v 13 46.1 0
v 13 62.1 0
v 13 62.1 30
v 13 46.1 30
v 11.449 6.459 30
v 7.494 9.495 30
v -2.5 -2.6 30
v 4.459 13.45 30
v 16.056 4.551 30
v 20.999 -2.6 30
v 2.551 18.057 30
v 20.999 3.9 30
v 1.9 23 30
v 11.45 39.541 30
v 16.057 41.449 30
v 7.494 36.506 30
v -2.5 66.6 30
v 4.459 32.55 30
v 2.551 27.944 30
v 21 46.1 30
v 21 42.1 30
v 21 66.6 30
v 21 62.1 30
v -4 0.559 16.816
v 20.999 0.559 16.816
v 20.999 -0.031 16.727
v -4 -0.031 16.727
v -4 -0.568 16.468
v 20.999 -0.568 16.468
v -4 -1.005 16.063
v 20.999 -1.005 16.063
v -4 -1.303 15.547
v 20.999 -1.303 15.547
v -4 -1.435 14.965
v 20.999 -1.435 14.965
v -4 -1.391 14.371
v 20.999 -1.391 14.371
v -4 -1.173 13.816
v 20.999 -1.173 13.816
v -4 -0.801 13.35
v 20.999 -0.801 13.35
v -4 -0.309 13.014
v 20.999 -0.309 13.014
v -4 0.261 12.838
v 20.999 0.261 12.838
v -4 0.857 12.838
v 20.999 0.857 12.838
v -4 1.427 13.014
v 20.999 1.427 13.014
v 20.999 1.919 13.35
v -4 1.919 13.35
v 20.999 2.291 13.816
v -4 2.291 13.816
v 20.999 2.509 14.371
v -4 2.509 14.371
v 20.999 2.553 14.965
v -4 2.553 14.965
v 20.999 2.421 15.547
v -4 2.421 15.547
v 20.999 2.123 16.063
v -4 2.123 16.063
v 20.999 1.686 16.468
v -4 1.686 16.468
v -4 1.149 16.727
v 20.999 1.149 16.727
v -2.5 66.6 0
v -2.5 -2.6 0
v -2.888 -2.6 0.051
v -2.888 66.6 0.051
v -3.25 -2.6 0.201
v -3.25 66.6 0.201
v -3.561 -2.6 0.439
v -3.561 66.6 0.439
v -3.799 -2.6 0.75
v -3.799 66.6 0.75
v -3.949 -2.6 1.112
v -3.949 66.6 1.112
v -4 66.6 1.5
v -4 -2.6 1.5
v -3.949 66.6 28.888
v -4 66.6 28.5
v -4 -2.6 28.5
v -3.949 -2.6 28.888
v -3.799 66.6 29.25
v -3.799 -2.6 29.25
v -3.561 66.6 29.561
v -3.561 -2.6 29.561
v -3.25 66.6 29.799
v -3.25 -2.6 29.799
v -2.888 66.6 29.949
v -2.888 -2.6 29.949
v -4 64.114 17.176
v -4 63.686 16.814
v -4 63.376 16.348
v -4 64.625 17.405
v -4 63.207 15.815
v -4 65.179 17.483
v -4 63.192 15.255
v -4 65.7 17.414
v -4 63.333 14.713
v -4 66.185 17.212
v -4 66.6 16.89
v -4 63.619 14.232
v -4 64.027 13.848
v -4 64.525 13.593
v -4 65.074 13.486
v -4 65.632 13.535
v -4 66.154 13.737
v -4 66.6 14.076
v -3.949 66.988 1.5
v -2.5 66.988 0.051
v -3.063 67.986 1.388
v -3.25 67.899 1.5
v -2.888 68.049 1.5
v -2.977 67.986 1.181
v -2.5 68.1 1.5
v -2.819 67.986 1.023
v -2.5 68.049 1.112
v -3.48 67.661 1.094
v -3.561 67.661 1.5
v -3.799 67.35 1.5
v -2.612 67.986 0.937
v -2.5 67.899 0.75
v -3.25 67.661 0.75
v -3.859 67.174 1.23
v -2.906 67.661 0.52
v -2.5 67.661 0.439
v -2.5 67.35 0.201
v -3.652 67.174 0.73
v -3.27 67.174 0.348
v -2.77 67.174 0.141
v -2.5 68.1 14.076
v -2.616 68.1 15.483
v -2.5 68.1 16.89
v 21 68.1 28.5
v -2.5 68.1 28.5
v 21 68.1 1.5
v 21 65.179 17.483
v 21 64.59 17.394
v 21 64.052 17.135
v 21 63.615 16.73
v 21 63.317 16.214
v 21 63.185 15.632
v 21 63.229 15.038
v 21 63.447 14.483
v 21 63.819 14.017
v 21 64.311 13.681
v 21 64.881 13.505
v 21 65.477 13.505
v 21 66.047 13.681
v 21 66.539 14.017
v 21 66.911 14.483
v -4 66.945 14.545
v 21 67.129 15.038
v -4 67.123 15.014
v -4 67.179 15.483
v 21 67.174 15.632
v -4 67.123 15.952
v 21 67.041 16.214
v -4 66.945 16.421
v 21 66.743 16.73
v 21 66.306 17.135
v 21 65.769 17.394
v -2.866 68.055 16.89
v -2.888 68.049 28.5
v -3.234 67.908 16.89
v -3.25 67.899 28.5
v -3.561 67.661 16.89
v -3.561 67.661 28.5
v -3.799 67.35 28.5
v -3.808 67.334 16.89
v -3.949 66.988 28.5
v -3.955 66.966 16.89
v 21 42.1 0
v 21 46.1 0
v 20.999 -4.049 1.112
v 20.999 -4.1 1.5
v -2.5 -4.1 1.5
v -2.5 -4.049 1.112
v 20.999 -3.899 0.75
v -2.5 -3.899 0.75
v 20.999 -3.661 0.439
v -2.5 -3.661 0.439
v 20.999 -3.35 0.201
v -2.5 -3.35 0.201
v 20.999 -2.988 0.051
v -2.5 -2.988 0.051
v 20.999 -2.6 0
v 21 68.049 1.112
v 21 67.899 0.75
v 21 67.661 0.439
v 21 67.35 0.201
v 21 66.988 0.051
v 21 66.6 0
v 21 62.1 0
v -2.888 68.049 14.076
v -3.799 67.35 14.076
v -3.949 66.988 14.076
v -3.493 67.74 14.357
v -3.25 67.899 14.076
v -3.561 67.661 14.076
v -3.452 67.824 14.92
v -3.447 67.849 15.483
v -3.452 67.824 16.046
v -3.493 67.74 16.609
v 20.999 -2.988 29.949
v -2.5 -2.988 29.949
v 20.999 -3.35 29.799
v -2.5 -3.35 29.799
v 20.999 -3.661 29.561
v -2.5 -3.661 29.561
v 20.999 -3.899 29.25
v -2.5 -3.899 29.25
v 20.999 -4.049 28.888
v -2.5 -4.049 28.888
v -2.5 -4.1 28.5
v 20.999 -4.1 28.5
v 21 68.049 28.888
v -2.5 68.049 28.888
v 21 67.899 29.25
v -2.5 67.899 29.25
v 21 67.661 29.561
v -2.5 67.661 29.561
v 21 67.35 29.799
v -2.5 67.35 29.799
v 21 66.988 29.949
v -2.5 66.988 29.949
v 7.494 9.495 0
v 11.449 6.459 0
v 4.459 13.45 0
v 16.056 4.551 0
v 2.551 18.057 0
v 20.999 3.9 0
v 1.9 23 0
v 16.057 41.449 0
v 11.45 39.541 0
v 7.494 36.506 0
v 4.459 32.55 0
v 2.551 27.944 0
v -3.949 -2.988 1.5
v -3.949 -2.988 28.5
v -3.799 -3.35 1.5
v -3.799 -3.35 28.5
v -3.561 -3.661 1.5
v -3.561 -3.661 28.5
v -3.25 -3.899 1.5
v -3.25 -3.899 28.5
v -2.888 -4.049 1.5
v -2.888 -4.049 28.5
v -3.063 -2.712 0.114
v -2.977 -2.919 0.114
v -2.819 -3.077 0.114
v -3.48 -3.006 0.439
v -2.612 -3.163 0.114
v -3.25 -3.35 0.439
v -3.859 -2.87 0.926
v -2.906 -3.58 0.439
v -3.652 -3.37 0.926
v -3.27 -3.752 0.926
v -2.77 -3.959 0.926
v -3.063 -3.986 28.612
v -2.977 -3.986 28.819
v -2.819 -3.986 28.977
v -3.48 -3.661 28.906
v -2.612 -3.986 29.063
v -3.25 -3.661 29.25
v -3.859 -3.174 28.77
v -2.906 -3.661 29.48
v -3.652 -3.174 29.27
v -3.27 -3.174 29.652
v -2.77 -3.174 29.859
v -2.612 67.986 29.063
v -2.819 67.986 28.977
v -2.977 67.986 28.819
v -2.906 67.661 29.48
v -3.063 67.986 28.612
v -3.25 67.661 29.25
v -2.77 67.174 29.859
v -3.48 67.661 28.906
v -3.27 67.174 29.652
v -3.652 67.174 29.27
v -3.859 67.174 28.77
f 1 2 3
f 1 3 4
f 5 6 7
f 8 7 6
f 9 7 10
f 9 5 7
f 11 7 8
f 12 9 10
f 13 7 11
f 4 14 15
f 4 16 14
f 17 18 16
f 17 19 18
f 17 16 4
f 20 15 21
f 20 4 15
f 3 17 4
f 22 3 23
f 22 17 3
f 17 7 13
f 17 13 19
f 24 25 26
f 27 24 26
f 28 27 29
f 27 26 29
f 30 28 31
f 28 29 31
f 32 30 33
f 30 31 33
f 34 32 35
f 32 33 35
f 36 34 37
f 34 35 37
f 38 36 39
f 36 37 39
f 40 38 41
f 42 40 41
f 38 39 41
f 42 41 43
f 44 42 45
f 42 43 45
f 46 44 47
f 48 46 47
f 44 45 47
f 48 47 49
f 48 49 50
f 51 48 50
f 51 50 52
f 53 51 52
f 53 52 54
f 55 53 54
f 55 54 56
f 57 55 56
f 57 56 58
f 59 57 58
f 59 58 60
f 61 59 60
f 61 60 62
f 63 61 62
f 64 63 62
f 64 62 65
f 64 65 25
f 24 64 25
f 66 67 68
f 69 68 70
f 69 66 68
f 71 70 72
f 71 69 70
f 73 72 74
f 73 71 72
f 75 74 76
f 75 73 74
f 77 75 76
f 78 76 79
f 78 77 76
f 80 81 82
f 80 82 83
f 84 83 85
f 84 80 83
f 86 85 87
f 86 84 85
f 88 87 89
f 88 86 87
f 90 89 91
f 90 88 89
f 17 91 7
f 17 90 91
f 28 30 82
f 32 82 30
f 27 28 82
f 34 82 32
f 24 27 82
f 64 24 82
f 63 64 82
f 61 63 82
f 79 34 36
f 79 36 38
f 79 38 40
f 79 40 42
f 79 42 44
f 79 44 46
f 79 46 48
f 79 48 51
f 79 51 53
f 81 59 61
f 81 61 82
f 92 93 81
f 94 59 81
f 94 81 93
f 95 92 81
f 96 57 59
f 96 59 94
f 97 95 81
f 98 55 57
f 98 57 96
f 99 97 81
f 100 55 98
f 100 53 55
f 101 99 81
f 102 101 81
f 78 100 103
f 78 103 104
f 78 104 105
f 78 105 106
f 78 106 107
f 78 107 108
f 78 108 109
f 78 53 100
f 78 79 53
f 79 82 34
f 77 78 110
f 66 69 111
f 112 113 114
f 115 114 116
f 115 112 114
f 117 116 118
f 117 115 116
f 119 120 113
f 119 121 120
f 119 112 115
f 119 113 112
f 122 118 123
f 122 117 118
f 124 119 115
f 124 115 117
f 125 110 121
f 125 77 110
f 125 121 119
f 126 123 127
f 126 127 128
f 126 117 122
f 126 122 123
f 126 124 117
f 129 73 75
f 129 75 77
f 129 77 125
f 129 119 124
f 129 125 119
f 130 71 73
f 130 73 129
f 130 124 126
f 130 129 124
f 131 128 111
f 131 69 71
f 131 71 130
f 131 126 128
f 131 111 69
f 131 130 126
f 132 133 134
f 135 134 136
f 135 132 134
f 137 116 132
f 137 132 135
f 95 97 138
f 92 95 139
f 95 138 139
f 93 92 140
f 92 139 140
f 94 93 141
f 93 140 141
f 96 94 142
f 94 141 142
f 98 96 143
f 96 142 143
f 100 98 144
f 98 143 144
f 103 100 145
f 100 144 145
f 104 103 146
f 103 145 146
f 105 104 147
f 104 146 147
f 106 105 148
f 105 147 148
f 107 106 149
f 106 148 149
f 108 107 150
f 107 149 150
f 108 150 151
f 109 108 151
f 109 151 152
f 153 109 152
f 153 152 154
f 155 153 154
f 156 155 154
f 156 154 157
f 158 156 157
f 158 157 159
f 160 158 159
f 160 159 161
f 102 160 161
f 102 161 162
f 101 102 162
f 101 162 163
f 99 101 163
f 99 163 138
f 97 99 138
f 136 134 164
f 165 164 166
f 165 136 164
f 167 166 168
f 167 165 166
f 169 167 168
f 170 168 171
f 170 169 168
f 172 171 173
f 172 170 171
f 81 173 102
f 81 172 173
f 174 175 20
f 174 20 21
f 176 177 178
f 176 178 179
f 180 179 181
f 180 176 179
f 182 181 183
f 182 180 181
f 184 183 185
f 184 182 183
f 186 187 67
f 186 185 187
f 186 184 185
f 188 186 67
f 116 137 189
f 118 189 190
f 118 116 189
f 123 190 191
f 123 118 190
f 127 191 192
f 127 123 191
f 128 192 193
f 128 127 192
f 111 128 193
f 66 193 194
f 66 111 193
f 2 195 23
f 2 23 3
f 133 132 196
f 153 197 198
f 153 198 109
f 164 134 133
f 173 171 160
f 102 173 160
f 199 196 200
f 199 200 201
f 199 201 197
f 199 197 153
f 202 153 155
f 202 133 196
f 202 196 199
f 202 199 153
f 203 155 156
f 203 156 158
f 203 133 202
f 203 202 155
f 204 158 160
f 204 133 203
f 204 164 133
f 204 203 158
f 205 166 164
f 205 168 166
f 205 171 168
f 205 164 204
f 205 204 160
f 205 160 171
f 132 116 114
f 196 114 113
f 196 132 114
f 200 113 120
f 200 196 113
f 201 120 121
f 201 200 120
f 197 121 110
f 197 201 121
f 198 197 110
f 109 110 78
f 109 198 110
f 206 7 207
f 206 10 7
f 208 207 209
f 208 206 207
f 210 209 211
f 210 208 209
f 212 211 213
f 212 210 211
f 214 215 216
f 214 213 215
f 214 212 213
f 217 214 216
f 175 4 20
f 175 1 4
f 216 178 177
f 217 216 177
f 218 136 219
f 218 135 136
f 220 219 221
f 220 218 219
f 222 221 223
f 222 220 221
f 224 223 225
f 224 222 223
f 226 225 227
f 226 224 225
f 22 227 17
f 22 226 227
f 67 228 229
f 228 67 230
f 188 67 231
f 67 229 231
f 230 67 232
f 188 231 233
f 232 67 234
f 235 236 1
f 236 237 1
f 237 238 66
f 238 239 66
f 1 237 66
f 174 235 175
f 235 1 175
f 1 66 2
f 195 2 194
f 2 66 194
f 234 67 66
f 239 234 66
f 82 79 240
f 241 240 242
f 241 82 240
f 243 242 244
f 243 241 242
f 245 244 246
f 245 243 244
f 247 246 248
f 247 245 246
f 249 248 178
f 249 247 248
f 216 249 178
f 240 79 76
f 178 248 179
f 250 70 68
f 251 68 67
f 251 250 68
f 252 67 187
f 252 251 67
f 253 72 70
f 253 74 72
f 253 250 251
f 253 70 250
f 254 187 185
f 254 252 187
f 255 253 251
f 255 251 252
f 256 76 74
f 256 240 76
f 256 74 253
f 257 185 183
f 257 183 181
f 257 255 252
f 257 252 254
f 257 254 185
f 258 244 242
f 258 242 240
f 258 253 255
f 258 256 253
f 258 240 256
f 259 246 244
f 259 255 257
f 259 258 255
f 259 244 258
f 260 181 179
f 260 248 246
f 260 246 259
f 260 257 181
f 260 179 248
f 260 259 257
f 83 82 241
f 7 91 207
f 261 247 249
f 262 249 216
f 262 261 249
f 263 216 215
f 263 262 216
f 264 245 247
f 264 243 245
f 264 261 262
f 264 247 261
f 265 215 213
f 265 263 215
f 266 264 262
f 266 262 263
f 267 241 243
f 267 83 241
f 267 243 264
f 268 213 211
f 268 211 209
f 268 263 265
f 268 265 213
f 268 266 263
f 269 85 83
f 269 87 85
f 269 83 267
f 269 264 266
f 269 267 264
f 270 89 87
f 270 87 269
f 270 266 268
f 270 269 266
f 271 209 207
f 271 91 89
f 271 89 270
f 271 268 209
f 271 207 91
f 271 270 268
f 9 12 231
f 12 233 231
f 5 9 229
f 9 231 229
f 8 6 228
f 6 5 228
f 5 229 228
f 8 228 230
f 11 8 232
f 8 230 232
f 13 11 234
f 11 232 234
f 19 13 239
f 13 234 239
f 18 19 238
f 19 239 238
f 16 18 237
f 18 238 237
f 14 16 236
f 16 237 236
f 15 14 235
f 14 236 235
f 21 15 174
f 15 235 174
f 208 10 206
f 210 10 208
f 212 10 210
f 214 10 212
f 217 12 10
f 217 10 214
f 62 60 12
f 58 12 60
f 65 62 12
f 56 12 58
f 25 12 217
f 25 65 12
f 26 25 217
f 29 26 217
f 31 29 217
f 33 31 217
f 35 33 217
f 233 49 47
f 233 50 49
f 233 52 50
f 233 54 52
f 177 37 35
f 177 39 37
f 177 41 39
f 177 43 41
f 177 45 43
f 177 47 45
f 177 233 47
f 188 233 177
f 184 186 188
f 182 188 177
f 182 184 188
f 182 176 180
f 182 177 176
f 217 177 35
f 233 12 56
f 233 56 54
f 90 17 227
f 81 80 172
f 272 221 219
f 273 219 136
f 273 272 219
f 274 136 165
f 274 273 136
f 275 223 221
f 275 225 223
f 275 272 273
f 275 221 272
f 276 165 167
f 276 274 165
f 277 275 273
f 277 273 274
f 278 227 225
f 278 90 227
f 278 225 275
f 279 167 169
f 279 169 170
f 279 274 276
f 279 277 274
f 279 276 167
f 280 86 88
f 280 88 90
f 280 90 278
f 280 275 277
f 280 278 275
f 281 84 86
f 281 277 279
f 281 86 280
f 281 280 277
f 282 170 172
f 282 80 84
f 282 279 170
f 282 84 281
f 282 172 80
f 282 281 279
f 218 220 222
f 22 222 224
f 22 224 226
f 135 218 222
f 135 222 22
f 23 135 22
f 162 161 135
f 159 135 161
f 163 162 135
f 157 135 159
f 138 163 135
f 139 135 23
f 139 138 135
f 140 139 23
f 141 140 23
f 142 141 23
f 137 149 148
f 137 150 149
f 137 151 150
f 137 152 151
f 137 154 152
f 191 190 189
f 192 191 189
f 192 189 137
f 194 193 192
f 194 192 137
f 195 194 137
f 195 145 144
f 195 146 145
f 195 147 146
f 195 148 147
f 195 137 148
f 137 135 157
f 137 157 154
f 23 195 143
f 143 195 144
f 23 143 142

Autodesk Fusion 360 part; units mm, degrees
sketch "Esboço1" plane through (0, 0, 0) normal (0, 0, 1) x (1, 0, 0)
  line L0 (13, 46.1) -> (21, 46.1)
  line L1 (13, 62.1) -> (13, 46.1)
  line L2 (-4, -4.1) -> (-4, 68.1)
  line L3 (-4, -4.1) -> (20.9993, -4.1)
  line L4 (21, 68.1) -> (21, 62.1)
  line L5 (21, 62.1) -> (13, 62.1)
  line L6 (20.9993, 3.9) -> (20.9993, -4.1)
  line L7 (21, 46.1) -> (21, 42.1)
  arc A0 (21, 42.1) -> (20.9993, 3.9) centre (21, 23) ccw
  line L8 (-4, 68.1) -> (21, 68.1)
  dimension "d2" = 16
  dimension "d3" = 8
  dimension "d5" = 6
  dimension "d8" = 8
  dimension "d10" = 8
  dimension "d36" = 25
  dimension "d12" = 4
  dimension "d13" = 19.1
extrude "Extrusão1" add sketch "Esboço1" along normal blind 30
hole "Furo1" at (-4, 65.1791, 15.483) direction (1, 0, 0) diameter 4 depth 25 tip angle 180
hole "Furo2" at (-4, 0.559, 14.816) direction (1, 0, 0) diameter 4 depth 25 tip angle 180
fillet "Arredondamento1" radius 1.5 5 edges at (-4, 32, 30) (-4, -4.1, 15) (8.4996, -4.1, 30) (8.4996, -4.1, 0) (-4, 32, 0)
fillet "Arredondamento2" radius 1.5 5 edges at (9.25, 68.1, 30) (-3.5607, 68.1, 29.5607) (-4, 68.1, 15) (-3.5607, 68.1, 0.4393) (9.25, 68.1, 0)
